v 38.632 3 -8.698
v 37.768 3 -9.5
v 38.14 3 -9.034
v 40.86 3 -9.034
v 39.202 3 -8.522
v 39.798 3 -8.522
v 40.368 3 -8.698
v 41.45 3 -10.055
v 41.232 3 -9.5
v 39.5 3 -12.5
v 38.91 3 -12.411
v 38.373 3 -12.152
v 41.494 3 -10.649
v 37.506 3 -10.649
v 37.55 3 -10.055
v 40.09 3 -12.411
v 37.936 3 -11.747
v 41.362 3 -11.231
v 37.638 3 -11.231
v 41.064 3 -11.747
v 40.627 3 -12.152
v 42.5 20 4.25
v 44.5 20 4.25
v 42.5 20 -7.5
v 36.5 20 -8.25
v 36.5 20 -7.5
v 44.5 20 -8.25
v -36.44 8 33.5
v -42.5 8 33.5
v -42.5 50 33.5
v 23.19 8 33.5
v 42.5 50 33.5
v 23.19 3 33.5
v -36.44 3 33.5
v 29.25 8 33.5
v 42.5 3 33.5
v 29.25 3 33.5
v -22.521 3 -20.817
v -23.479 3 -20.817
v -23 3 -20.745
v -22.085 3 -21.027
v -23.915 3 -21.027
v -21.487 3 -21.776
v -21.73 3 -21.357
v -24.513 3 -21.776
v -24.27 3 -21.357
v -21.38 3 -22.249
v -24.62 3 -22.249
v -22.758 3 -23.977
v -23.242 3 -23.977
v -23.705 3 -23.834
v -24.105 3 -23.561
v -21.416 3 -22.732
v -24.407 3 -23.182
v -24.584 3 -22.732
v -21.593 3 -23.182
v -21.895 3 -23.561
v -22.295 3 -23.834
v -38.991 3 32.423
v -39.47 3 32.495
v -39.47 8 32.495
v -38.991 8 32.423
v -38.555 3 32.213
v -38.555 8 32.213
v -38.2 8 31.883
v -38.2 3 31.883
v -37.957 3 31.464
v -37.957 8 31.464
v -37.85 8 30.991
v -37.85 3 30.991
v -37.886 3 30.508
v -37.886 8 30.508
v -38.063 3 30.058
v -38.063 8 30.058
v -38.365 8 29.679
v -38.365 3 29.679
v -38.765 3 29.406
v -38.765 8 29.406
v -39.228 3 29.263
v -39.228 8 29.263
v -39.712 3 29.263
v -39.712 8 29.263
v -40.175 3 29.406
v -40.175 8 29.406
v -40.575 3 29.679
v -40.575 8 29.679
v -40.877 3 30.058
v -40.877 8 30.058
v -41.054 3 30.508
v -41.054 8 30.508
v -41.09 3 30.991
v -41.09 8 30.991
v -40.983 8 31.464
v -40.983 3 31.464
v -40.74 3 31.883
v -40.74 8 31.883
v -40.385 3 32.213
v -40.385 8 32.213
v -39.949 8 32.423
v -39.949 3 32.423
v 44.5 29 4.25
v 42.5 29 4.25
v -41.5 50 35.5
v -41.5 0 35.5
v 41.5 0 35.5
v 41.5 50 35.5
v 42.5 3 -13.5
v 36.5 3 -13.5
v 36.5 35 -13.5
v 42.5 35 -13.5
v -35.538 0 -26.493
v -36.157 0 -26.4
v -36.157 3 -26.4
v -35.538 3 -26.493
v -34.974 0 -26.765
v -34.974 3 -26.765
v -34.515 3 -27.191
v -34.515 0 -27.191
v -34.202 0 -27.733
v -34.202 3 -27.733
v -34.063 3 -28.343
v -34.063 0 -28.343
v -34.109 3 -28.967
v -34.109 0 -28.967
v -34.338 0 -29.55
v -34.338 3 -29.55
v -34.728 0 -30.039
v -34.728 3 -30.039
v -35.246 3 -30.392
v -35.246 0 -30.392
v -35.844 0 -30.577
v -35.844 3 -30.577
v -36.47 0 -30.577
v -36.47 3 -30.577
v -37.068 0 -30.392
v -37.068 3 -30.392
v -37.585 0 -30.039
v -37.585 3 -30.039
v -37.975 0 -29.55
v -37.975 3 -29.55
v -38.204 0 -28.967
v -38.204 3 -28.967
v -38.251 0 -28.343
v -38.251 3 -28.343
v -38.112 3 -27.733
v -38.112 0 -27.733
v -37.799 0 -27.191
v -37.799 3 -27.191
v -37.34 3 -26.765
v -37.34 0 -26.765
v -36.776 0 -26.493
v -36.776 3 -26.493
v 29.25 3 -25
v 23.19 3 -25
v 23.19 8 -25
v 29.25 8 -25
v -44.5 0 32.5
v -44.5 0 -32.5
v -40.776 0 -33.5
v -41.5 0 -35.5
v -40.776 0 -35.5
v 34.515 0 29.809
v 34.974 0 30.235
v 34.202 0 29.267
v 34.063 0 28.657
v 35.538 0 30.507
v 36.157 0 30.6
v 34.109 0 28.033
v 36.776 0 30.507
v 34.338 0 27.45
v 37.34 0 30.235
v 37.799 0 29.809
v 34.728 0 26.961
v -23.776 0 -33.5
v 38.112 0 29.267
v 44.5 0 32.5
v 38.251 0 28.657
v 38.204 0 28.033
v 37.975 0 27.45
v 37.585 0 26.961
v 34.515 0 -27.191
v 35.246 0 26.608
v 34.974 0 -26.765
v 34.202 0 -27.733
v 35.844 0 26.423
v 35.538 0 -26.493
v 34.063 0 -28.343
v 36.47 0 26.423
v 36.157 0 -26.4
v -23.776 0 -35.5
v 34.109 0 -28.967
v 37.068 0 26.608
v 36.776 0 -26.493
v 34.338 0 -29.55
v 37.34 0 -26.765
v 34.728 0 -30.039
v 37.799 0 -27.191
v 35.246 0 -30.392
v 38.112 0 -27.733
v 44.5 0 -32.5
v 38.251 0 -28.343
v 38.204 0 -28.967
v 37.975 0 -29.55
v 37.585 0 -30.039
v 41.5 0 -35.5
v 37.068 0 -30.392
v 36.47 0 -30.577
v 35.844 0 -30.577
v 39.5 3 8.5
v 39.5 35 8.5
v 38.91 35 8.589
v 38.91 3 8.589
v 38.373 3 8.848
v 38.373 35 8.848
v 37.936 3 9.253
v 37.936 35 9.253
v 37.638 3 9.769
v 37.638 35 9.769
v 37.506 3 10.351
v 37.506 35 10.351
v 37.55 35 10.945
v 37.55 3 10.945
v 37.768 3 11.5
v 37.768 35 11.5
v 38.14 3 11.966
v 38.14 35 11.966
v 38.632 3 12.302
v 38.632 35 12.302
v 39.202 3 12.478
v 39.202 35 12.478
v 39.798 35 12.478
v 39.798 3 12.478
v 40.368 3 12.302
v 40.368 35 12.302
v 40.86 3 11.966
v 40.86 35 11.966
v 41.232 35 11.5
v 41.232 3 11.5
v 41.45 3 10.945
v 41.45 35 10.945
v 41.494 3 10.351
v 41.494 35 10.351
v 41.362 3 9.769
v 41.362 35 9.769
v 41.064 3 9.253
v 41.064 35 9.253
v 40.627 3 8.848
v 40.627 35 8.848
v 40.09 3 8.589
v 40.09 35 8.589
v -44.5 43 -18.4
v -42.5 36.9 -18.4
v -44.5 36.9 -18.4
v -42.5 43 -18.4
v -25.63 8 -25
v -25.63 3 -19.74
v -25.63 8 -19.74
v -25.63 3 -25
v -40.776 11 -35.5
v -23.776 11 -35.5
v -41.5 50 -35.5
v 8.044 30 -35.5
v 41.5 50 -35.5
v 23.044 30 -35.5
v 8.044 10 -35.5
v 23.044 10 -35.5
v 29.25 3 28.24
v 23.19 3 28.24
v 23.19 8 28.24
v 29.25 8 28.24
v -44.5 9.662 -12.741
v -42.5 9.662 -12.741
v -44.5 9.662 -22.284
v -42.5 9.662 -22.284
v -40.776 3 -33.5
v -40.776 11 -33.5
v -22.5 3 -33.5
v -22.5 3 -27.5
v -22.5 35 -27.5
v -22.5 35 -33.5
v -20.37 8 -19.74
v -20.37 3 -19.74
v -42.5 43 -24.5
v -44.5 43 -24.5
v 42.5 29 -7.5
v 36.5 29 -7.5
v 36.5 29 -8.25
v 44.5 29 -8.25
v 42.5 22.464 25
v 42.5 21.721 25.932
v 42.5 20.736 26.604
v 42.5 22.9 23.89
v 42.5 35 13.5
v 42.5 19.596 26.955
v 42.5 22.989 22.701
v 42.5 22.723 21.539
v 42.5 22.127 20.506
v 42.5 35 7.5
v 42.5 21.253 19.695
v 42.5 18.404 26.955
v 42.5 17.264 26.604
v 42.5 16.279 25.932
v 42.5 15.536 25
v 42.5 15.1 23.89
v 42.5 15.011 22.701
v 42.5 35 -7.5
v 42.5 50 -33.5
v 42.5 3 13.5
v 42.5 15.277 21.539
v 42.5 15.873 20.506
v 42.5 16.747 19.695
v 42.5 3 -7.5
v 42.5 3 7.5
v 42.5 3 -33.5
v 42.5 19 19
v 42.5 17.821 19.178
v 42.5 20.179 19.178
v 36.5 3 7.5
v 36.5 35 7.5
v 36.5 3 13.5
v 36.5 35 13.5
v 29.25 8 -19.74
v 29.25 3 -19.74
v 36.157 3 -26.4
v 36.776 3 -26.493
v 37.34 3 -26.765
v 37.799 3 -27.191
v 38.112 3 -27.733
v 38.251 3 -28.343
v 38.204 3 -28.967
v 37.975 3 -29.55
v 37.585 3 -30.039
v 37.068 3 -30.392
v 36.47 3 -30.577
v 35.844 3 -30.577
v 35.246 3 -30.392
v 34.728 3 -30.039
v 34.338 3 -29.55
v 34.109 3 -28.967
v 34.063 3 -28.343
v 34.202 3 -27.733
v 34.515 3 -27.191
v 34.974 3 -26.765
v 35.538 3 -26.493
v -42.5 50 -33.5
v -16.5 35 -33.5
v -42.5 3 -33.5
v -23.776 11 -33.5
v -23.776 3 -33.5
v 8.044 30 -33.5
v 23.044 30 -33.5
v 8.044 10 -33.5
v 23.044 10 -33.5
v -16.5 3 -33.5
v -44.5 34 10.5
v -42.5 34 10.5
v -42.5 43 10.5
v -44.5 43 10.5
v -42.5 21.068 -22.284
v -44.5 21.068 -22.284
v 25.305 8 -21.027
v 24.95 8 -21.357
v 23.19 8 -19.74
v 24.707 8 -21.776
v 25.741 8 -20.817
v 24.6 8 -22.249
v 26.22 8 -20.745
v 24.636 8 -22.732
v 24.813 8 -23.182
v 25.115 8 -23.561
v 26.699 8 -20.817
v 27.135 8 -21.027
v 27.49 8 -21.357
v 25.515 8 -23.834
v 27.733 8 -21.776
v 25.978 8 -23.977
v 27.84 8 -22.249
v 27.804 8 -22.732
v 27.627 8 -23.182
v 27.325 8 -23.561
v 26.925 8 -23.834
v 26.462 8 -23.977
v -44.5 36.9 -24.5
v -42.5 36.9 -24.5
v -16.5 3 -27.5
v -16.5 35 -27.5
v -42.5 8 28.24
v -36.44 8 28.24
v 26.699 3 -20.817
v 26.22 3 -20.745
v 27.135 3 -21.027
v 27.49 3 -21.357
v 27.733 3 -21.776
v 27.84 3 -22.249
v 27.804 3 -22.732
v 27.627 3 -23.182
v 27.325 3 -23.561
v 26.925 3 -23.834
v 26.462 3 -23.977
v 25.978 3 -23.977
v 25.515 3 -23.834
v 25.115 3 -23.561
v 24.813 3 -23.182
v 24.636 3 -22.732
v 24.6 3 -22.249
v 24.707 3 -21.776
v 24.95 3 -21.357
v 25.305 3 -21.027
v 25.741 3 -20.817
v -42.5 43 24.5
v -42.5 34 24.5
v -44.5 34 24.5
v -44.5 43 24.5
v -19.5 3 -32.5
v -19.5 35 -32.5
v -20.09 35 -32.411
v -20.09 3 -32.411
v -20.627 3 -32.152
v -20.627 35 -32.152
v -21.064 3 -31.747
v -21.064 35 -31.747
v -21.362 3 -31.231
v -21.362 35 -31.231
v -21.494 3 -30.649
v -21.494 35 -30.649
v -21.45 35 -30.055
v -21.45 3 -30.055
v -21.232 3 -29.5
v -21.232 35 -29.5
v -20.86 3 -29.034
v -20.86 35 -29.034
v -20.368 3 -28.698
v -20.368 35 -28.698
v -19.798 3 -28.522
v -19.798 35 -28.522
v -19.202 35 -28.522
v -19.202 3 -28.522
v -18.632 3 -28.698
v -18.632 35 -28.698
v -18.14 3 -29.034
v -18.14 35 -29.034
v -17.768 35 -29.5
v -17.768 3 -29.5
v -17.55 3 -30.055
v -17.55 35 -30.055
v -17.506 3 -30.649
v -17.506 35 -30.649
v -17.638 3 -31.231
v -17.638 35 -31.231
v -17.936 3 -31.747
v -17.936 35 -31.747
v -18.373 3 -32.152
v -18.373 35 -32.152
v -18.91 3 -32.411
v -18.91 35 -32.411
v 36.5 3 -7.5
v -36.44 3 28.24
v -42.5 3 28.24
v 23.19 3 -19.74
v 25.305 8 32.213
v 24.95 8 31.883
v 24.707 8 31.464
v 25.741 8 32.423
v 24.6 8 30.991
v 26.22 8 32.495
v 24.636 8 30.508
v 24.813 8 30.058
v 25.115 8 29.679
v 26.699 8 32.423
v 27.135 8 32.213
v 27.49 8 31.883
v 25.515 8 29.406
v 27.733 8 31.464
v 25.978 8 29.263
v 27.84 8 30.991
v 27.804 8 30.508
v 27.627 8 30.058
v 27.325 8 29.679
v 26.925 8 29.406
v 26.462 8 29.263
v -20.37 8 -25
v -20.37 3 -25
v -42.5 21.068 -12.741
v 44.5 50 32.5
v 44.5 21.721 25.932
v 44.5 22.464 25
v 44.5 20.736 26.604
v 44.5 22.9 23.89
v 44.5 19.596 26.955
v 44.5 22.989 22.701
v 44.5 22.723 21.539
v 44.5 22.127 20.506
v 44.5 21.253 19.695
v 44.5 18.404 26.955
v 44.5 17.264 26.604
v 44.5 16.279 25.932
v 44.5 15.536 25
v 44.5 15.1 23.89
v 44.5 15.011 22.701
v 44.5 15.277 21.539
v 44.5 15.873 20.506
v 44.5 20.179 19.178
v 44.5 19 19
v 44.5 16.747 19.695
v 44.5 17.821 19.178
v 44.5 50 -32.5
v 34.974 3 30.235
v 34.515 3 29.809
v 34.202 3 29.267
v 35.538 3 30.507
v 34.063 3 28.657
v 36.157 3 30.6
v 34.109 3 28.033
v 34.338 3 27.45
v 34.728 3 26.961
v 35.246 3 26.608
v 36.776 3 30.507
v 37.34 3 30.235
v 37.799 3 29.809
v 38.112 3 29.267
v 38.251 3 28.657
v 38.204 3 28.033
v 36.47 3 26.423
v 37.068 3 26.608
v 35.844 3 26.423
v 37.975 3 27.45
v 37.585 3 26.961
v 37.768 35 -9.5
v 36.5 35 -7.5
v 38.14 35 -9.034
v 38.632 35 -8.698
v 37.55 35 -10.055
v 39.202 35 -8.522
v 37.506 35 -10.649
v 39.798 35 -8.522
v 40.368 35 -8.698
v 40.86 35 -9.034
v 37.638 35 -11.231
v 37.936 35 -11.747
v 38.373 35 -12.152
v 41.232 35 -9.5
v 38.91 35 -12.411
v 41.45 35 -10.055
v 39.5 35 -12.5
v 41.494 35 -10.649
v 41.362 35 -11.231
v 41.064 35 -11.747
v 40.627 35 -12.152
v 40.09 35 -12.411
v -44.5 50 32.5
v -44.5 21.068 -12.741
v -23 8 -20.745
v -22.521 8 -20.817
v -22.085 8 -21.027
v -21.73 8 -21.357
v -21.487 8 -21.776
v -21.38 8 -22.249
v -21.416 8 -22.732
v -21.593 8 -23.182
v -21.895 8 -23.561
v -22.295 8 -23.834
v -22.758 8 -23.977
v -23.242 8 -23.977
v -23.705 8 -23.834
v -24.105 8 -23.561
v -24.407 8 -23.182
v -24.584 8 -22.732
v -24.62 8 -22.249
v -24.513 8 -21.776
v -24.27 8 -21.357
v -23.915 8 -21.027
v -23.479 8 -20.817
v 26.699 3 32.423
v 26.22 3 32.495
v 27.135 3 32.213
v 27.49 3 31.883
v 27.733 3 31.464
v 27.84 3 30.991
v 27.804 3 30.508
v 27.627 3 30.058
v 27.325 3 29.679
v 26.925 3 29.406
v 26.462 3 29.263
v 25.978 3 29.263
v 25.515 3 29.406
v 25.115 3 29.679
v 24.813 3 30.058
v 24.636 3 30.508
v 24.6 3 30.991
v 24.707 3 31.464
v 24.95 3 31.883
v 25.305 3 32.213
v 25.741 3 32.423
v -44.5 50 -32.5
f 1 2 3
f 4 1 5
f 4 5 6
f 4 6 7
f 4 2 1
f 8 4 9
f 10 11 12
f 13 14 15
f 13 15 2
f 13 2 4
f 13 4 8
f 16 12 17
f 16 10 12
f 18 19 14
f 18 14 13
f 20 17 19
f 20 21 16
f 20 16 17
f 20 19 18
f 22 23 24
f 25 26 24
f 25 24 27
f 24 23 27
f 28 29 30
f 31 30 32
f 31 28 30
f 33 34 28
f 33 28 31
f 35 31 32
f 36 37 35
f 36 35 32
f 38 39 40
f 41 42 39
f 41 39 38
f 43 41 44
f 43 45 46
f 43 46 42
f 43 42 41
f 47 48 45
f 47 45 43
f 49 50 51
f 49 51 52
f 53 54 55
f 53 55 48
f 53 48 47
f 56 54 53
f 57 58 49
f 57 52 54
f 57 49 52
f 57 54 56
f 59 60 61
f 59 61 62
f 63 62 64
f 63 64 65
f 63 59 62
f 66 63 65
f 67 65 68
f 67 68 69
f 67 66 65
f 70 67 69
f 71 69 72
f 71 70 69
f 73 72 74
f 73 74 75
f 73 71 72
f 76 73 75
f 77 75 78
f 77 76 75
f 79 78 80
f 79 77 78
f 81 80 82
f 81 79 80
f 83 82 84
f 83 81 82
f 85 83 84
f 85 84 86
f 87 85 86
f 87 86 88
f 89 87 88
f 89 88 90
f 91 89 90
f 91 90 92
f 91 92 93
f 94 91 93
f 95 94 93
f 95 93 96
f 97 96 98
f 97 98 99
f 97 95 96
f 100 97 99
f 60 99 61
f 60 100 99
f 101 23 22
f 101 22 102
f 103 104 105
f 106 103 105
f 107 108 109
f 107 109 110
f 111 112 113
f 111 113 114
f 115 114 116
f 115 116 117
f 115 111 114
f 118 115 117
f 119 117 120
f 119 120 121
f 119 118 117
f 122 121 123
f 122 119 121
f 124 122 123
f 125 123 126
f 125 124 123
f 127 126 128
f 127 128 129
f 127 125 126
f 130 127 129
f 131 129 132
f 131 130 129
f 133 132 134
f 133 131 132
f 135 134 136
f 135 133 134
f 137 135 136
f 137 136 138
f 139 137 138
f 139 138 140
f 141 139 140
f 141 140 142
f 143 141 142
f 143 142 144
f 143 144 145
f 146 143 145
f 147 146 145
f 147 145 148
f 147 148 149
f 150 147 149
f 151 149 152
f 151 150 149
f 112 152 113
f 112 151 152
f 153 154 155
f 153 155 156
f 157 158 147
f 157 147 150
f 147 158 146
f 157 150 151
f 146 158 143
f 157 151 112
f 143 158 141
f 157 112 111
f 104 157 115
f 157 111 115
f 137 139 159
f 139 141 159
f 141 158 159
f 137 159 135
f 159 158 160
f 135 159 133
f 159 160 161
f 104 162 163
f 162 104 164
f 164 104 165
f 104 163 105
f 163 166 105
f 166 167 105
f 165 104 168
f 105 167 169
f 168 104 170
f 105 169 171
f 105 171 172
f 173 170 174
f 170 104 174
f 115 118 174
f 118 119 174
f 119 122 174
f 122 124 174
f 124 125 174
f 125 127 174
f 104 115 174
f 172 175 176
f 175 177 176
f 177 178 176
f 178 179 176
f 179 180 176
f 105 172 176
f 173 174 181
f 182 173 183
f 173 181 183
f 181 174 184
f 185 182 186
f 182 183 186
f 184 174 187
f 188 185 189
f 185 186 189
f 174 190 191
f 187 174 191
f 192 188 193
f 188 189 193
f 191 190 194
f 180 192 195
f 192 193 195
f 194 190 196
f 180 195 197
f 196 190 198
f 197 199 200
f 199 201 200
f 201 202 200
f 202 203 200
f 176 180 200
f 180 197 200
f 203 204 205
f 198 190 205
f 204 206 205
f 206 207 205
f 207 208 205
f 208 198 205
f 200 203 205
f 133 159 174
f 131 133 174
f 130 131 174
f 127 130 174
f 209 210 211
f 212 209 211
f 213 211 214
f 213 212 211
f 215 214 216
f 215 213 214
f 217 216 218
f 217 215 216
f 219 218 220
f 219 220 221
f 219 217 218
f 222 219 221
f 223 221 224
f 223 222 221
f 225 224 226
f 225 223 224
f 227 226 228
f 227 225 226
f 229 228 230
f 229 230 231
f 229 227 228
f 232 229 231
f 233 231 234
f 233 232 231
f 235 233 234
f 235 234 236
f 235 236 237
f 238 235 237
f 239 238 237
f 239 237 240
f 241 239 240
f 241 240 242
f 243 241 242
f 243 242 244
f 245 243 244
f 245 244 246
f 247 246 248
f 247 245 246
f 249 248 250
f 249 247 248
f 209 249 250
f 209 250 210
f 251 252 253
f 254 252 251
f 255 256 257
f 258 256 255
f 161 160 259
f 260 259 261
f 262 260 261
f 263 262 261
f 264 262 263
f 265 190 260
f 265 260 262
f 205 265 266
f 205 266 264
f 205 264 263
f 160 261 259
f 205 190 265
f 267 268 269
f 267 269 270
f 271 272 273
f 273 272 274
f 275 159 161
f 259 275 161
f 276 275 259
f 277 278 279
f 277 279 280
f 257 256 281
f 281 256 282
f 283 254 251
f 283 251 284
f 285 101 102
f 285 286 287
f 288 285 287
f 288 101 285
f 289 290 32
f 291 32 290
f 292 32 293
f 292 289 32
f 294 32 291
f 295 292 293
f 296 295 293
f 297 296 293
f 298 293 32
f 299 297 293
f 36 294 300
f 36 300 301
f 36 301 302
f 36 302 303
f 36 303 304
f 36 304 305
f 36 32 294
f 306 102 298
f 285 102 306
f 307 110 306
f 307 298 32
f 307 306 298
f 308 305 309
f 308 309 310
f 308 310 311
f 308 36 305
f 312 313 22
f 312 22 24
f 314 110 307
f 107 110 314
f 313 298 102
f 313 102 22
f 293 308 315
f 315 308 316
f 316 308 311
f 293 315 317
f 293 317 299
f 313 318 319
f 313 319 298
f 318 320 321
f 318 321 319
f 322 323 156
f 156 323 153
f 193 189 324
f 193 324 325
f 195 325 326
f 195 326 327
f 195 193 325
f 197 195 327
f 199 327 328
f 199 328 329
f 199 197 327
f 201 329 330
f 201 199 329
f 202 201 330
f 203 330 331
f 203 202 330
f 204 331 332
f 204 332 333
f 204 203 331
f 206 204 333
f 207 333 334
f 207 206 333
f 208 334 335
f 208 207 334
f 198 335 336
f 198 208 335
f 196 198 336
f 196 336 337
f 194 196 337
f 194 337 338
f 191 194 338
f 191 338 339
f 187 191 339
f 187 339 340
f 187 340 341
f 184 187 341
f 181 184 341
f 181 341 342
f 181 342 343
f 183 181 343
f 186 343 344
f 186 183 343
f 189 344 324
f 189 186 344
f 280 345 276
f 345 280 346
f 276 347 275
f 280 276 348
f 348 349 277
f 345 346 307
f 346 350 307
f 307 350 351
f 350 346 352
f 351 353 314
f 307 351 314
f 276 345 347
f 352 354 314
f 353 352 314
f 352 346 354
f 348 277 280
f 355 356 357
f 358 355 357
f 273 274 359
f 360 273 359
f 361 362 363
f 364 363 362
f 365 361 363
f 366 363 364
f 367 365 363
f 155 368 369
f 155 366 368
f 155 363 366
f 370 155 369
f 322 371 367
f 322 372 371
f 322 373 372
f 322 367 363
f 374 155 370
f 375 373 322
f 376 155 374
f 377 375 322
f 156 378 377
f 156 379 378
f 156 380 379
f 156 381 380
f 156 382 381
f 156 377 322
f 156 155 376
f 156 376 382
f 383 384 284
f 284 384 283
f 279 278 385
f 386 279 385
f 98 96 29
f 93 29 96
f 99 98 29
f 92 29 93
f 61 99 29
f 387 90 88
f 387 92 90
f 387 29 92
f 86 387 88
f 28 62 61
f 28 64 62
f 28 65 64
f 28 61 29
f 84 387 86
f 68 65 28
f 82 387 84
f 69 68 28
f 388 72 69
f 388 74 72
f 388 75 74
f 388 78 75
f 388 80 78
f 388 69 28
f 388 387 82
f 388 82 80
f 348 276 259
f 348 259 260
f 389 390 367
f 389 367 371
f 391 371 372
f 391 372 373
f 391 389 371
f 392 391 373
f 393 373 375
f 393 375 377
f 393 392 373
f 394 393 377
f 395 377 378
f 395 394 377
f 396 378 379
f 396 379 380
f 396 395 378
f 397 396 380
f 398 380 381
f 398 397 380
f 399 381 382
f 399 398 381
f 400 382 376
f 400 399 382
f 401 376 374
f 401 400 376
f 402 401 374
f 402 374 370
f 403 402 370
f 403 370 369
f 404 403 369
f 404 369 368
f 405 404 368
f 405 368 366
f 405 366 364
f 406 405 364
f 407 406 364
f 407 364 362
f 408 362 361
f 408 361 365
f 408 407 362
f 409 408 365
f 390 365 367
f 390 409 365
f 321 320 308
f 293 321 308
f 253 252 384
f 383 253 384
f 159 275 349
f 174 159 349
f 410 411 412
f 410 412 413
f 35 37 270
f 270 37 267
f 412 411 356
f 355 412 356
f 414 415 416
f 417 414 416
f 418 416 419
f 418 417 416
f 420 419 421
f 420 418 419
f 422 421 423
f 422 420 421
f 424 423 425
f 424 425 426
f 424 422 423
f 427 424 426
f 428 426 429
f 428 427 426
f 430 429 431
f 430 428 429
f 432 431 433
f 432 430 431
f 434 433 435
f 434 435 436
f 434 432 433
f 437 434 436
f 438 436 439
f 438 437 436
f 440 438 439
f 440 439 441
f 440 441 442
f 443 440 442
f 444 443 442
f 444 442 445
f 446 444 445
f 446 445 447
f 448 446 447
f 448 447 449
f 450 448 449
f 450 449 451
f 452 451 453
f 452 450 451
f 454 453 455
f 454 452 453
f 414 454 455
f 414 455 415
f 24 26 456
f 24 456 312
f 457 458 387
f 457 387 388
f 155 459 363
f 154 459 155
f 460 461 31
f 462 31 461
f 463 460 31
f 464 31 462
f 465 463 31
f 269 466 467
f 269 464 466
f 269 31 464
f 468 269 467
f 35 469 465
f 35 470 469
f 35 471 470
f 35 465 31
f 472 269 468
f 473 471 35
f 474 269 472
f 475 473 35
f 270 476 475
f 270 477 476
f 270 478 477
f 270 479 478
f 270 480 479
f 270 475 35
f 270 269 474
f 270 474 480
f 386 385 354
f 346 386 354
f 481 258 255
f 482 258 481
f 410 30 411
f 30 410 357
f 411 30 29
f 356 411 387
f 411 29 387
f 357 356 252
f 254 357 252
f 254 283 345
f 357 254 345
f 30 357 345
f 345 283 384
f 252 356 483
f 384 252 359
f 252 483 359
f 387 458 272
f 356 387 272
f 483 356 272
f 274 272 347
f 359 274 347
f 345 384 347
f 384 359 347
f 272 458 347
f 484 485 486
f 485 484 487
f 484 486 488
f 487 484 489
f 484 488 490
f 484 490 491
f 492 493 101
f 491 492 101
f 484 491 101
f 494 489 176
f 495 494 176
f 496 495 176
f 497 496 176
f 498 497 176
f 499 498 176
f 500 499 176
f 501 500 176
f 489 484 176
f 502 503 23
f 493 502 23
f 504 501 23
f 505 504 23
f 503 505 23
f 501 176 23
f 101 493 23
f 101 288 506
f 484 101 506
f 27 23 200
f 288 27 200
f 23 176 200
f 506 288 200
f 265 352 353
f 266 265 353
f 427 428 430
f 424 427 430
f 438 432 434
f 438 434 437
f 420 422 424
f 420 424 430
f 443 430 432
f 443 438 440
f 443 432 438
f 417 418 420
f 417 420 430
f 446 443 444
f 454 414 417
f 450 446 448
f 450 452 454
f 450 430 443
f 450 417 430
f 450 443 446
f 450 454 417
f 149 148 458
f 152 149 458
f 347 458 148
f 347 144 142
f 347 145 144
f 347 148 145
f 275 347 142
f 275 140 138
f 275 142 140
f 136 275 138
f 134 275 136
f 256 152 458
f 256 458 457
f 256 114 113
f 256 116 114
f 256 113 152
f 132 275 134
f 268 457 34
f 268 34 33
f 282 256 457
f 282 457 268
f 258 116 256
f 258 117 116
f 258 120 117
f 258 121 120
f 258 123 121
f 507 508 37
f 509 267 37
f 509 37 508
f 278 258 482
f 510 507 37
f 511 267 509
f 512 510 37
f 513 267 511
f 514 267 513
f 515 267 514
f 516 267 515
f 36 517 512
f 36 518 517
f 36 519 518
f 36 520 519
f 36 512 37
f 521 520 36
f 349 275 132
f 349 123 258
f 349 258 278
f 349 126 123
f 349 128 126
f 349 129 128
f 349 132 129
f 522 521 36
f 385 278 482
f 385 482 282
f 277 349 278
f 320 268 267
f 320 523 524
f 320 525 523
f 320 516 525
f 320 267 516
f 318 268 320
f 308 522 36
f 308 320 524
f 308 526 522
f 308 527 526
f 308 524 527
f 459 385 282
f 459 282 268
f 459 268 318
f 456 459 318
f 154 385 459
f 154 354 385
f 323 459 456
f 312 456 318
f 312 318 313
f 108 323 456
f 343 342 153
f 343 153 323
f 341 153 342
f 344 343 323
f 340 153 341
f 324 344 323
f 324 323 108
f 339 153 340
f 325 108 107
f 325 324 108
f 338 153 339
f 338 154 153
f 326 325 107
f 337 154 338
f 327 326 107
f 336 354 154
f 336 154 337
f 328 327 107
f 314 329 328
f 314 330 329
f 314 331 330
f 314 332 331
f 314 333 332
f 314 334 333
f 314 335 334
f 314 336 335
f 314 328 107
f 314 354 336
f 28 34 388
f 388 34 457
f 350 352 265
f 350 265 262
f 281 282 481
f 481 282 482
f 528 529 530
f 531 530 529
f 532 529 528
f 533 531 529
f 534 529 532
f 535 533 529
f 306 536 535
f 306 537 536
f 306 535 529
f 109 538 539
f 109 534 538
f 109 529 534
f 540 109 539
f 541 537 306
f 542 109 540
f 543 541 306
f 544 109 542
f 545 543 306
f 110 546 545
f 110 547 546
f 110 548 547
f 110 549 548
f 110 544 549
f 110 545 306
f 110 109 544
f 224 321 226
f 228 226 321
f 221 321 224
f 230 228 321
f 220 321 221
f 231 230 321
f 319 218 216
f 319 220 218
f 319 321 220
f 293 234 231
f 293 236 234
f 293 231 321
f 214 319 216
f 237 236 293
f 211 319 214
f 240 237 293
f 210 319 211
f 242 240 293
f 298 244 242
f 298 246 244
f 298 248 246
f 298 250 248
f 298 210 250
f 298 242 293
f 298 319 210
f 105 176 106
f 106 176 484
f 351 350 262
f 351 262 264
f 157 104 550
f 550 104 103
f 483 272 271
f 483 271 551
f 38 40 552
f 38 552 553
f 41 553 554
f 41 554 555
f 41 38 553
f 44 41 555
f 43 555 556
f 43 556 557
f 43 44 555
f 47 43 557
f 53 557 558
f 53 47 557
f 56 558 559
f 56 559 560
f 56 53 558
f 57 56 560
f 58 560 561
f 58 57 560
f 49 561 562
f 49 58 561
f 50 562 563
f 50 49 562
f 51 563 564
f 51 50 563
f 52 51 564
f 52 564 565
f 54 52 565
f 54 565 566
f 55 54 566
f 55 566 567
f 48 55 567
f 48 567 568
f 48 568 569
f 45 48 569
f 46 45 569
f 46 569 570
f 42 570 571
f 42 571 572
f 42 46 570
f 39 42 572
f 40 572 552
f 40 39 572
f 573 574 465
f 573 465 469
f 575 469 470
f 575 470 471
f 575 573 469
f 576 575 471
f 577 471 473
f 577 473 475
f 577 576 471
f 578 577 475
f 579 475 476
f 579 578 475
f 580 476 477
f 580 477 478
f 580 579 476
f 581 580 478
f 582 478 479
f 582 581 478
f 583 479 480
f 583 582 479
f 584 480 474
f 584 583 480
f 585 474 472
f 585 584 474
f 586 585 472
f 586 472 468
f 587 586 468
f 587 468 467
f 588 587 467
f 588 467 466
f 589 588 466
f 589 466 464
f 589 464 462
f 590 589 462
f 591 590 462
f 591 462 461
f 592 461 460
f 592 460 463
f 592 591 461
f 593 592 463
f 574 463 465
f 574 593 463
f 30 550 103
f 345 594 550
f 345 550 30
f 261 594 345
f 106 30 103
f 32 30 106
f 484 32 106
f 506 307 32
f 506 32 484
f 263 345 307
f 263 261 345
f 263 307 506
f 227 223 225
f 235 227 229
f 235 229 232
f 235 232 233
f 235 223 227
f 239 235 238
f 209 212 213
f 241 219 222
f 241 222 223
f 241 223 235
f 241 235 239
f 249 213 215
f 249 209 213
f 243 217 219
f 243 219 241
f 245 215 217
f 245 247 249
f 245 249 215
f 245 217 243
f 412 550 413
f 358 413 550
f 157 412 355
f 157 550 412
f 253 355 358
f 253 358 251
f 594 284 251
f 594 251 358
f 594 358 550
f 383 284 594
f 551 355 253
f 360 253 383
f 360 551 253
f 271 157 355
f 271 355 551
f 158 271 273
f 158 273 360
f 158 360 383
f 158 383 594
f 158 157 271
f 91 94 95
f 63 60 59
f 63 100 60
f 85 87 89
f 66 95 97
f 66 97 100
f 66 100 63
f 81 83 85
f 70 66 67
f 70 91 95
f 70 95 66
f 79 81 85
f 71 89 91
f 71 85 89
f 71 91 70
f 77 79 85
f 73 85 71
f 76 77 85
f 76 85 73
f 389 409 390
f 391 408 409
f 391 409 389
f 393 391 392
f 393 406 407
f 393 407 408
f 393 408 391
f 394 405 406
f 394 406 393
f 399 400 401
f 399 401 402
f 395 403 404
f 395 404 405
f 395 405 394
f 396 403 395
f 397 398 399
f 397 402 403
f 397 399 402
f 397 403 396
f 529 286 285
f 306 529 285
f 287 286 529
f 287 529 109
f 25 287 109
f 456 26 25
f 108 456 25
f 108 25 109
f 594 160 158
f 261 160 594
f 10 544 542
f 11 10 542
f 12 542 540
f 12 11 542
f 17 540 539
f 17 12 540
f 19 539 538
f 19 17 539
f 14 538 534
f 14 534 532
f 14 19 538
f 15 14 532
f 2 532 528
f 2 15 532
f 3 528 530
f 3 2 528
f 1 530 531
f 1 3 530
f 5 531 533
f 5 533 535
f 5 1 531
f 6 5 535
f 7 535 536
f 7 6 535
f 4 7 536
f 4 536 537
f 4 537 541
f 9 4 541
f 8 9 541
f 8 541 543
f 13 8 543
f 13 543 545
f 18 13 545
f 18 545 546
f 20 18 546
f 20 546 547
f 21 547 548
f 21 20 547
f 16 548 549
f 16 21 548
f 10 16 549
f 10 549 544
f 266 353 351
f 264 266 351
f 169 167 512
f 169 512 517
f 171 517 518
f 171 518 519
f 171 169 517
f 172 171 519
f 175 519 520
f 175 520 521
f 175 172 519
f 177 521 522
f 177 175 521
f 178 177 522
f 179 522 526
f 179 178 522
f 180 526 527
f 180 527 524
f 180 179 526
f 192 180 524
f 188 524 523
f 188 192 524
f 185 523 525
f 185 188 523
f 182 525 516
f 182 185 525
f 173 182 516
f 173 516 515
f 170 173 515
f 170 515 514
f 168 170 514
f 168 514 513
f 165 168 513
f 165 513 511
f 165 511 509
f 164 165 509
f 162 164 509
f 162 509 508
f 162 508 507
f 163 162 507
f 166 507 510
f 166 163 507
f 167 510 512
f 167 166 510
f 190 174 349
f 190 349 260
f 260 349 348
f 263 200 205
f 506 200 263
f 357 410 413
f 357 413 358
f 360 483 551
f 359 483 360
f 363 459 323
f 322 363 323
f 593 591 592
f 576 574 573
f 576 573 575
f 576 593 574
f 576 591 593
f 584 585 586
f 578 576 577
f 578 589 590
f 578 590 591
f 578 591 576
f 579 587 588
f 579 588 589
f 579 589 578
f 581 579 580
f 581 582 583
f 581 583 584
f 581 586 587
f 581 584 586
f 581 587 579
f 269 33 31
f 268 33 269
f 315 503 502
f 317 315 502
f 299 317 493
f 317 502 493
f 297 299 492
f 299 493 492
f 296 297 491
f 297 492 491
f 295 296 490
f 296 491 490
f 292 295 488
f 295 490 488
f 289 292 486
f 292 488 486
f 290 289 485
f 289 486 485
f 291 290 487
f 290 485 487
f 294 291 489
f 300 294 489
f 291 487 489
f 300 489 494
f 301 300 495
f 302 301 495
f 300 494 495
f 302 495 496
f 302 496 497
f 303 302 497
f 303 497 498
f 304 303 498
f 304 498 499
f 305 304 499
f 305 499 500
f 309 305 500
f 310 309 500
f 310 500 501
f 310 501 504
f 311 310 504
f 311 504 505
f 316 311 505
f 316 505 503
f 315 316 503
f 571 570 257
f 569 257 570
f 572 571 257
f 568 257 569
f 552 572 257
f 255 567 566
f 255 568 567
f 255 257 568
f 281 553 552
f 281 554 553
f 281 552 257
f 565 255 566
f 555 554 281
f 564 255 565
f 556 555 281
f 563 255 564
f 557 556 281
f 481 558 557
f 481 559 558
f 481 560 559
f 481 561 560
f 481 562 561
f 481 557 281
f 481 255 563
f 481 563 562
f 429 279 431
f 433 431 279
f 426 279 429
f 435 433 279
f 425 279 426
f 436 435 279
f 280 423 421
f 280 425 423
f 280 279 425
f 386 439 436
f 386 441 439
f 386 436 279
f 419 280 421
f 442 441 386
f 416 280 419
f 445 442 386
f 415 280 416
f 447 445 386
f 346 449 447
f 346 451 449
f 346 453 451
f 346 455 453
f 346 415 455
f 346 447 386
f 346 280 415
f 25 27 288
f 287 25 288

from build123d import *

# Parameters (mm, degrees)
SKETCH1_W           = 85
SKETCH1_H           = 67
SKETCH1_R           = 2.1
BOSS_EXTRUDE1_DEPTH = 3
SKETCH1_3_W         = 89
SKETCH1_3_H         = 71
SKETCH1_3_W_2       = 85
SKETCH1_3_H_2       = 67
BOSS_EXTRUDE2_DEPTH = 50
CHAMFER1_SIZE       = 3
SKETCH2_W           = 6
SKETCH2_H           = 6
SKETCH2_R           = 2
BOSS_EXTRUDE3_DEPTH = 32
SKETCH4_W           = 6.06
SKETCH4_H           = 5.26
SKETCH4_R           = 1.625
SKETCH4_W_2         = 5.26
BOSS_EXTRUDE4_DEPTH = 5
SKETCH5_W           = 15
SKETCH5_H           = 20
SKETCH5_W_2         = 17
SKETCH5_H_2         = 11
CUT_EXTRUDE1_DEPTH  = 3
SKETCH7_R           = 4
SKETCH7_W           = 12.5
SKETCH7_H           = 9
CUT_EXTRUDE2_DEPTH  = 10
SKETCH6_W           = 9.543049048
SKETCH6_H           = 11.406034719
SKETCH6_W_2         = 14
SKETCH6_H_2         = 9
SKETCH6_W_3         = 6.1
SKETCH6_H_3         = 6.1
CUT_EXTRUDE3_DEPTH  = 10


with BuildPart() as part:
    # Sketch1 → Boss-Extrude1 (new body)
    with BuildSketch(Plane(origin=(0, 0, 0), x_dir=(1, 0, 0), z_dir=(0, 1, 0))):
        Rectangle(SKETCH1_W, SKETCH1_H)
        with Locations(Location((36.156716418, -28.5, 0), (0, 0, 270))):
            Circle(SKETCH1_R, mode=Mode.SUBTRACT)
        with Locations(Location((36.156716418, 28.5, 0), (0, 0, 270))):
            Circle(SKETCH1_R, mode=Mode.SUBTRACT)
        with Locations(Location((-36.156716418, 28.5, 0), (0, 0, 270))):
            Circle(SKETCH1_R, mode=Mode.SUBTRACT)
    extrude(amount=BOSS_EXTRUDE1_DEPTH)

    # Sketch1<3> → Boss-Extrude2 (add)
    with BuildSketch(Plane(origin=(0, 0, 0), x_dir=(1, 0, 0), z_dir=(0, 1, 0))):
        Rectangle(SKETCH1_3_W, SKETCH1_3_H)
        Rectangle(SKETCH1_3_W_2, SKETCH1_3_H_2, mode=Mode.SUBTRACT)
    extrude(amount=BOSS_EXTRUDE2_DEPTH)

    # Chamfer1
    chamfer1_edges = [part.edges().sort_by_distance(p)[0] for p in [
        (-44.5, 25, -35.5),
        (-44.5, 25, 35.5),
        (44.5, 25, 35.5),
        (44.5, 25, -35.5),
    ]]
    chamfer(chamfer1_edges, length=CHAMFER1_SIZE)

    # Sketch2 → Boss-Extrude3 (add)
    # profile 1 of 3: a face of its own
    with BuildSketch(Plane(origin=(0, 3, 0), x_dir=(1, 0, 0), z_dir=(0, 1, 0))):
        with Locations((-19.5, 30.5)):
            Rectangle(SKETCH2_W, SKETCH2_H)
        with Locations(Location((-19.5, 30.5, 0), (0, 0, 90))):
            Circle(SKETCH2_R, mode=Mode.SUBTRACT)
    # profile 2 of 3: a face of its own
    with BuildSketch(Plane(origin=(0, 3, 0), x_dir=(1, 0, 0), z_dir=(0, 1, 0))):
        with Locations((39.5, 10.5)):
            Rectangle(SKETCH2_W, SKETCH2_H)
        with Locations(Location((39.5, 10.5, 0), (0, 0, 90))):
            Circle(SKETCH2_R, mode=Mode.SUBTRACT)
    # profile 3 of 3: a face of its own
    with BuildSketch(Plane(origin=(0, 3, 0), x_dir=(1, 0, 0), z_dir=(0, 1, 0))):
        with Locations((39.5, -10.5)):
            Rectangle(SKETCH2_W, SKETCH2_H)
        with Locations(Location((39.5, -10.5, 0), (0, 0, 90))):
            Circle(SKETCH2_R, mode=Mode.SUBTRACT)
    extrude(amount=BOSS_EXTRUDE3_DEPTH)

    # Sketch4 → Boss-Extrude4 (add)
    # profile 1 of 4: a face of its own
    with BuildSketch(Plane(origin=(0, 3, 0), x_dir=(1, 0, 0), z_dir=(0, 1, 0))):
        with Locations((-39.47, -30.87)):
            Rectangle(SKETCH4_W, SKETCH4_H)
        with Locations(Location((-39.47, -30.87, 0), (0, 0, 270))):
            Circle(SKETCH4_R, mode=Mode.SUBTRACT)
    # profile 2 of 4: a face of its own
    with BuildSketch(Plane(origin=(0, 3, 0), x_dir=(1, 0, 0), z_dir=(0, 1, 0))):
        with Locations((-23, 22.37)):
            Rectangle(SKETCH4_W_2, SKETCH4_H)
        with Locations(Location((-23, 22.37, 0), (0, 0, 270))):
            Circle(SKETCH4_R, mode=Mode.SUBTRACT)
    # profile 3 of 4: a face of its own
    with BuildSketch(Plane(origin=(0, 3, 0), x_dir=(1, 0, 0), z_dir=(0, 1, 0))):
        with Locations((26.22, 22.37)):
            Rectangle(SKETCH4_W, SKETCH4_H)
        with Locations(Location((26.22, 22.37, 0), (0, 0, 270))):
            Circle(SKETCH4_R, mode=Mode.SUBTRACT)
    # profile 4 of 4: a face of its own
    with BuildSketch(Plane(origin=(0, 3, 0), x_dir=(1, 0, 0), z_dir=(0, 1, 0))):
        with Locations((26.22, -30.87)):
            Rectangle(SKETCH4_W, SKETCH4_H)
        with Locations(Location((26.22, -30.87, 0), (0, 0, 270))):
            Circle(SKETCH4_R, mode=Mode.SUBTRACT)
    extrude(amount=BOSS_EXTRUDE4_DEPTH)

    # Sketch5 → Cut-Extrude1 (cut)
    with BuildSketch(Plane.XY.offset(-33.5)):
        with Locations((15.544213072, 20)):
            Rectangle(SKETCH5_W, SKETCH5_H)
        with Locations((-32.275786928, 5.5)):
            Rectangle(SKETCH5_W_2, SKETCH5_H_2)
    extrude(amount=-CUT_EXTRUDE1_DEPTH, mode=Mode.SUBTRACT)

    # Sketch7 → Cut-Extrude2 (cut)
    with BuildSketch(Plane(origin=(44.5, 0, 0), x_dir=(0, 0, -1), z_dir=(1, 0, 0))):
        with Locations((-23, 19)):
            Circle(SKETCH7_R)
        with Locations((2, 24.5)):
            Rectangle(SKETCH7_W, SKETCH7_H)
    extrude(amount=-CUT_EXTRUDE2_DEPTH, mode=Mode.SUBTRACT)

    # Sketch6 → Cut-Extrude3 (cut)
    with BuildSketch(Plane(origin=(-42.5, 0, 0), x_dir=(0, 0, -1), z_dir=(1, 0, 0))):
        with Locations((17.512756781, 15.365129708)):
            Rectangle(SKETCH6_W, SKETCH6_H)
        with Locations((-17.5, 38.5)):
            Rectangle(SKETCH6_W_2, SKETCH6_H_2)
        with Locations((21.45, 39.95)):
            Rectangle(SKETCH6_W_3, SKETCH6_H_3)
    extrude(amount=-CUT_EXTRUDE3_DEPTH, mode=Mode.SUBTRACT)


solid = part.part
